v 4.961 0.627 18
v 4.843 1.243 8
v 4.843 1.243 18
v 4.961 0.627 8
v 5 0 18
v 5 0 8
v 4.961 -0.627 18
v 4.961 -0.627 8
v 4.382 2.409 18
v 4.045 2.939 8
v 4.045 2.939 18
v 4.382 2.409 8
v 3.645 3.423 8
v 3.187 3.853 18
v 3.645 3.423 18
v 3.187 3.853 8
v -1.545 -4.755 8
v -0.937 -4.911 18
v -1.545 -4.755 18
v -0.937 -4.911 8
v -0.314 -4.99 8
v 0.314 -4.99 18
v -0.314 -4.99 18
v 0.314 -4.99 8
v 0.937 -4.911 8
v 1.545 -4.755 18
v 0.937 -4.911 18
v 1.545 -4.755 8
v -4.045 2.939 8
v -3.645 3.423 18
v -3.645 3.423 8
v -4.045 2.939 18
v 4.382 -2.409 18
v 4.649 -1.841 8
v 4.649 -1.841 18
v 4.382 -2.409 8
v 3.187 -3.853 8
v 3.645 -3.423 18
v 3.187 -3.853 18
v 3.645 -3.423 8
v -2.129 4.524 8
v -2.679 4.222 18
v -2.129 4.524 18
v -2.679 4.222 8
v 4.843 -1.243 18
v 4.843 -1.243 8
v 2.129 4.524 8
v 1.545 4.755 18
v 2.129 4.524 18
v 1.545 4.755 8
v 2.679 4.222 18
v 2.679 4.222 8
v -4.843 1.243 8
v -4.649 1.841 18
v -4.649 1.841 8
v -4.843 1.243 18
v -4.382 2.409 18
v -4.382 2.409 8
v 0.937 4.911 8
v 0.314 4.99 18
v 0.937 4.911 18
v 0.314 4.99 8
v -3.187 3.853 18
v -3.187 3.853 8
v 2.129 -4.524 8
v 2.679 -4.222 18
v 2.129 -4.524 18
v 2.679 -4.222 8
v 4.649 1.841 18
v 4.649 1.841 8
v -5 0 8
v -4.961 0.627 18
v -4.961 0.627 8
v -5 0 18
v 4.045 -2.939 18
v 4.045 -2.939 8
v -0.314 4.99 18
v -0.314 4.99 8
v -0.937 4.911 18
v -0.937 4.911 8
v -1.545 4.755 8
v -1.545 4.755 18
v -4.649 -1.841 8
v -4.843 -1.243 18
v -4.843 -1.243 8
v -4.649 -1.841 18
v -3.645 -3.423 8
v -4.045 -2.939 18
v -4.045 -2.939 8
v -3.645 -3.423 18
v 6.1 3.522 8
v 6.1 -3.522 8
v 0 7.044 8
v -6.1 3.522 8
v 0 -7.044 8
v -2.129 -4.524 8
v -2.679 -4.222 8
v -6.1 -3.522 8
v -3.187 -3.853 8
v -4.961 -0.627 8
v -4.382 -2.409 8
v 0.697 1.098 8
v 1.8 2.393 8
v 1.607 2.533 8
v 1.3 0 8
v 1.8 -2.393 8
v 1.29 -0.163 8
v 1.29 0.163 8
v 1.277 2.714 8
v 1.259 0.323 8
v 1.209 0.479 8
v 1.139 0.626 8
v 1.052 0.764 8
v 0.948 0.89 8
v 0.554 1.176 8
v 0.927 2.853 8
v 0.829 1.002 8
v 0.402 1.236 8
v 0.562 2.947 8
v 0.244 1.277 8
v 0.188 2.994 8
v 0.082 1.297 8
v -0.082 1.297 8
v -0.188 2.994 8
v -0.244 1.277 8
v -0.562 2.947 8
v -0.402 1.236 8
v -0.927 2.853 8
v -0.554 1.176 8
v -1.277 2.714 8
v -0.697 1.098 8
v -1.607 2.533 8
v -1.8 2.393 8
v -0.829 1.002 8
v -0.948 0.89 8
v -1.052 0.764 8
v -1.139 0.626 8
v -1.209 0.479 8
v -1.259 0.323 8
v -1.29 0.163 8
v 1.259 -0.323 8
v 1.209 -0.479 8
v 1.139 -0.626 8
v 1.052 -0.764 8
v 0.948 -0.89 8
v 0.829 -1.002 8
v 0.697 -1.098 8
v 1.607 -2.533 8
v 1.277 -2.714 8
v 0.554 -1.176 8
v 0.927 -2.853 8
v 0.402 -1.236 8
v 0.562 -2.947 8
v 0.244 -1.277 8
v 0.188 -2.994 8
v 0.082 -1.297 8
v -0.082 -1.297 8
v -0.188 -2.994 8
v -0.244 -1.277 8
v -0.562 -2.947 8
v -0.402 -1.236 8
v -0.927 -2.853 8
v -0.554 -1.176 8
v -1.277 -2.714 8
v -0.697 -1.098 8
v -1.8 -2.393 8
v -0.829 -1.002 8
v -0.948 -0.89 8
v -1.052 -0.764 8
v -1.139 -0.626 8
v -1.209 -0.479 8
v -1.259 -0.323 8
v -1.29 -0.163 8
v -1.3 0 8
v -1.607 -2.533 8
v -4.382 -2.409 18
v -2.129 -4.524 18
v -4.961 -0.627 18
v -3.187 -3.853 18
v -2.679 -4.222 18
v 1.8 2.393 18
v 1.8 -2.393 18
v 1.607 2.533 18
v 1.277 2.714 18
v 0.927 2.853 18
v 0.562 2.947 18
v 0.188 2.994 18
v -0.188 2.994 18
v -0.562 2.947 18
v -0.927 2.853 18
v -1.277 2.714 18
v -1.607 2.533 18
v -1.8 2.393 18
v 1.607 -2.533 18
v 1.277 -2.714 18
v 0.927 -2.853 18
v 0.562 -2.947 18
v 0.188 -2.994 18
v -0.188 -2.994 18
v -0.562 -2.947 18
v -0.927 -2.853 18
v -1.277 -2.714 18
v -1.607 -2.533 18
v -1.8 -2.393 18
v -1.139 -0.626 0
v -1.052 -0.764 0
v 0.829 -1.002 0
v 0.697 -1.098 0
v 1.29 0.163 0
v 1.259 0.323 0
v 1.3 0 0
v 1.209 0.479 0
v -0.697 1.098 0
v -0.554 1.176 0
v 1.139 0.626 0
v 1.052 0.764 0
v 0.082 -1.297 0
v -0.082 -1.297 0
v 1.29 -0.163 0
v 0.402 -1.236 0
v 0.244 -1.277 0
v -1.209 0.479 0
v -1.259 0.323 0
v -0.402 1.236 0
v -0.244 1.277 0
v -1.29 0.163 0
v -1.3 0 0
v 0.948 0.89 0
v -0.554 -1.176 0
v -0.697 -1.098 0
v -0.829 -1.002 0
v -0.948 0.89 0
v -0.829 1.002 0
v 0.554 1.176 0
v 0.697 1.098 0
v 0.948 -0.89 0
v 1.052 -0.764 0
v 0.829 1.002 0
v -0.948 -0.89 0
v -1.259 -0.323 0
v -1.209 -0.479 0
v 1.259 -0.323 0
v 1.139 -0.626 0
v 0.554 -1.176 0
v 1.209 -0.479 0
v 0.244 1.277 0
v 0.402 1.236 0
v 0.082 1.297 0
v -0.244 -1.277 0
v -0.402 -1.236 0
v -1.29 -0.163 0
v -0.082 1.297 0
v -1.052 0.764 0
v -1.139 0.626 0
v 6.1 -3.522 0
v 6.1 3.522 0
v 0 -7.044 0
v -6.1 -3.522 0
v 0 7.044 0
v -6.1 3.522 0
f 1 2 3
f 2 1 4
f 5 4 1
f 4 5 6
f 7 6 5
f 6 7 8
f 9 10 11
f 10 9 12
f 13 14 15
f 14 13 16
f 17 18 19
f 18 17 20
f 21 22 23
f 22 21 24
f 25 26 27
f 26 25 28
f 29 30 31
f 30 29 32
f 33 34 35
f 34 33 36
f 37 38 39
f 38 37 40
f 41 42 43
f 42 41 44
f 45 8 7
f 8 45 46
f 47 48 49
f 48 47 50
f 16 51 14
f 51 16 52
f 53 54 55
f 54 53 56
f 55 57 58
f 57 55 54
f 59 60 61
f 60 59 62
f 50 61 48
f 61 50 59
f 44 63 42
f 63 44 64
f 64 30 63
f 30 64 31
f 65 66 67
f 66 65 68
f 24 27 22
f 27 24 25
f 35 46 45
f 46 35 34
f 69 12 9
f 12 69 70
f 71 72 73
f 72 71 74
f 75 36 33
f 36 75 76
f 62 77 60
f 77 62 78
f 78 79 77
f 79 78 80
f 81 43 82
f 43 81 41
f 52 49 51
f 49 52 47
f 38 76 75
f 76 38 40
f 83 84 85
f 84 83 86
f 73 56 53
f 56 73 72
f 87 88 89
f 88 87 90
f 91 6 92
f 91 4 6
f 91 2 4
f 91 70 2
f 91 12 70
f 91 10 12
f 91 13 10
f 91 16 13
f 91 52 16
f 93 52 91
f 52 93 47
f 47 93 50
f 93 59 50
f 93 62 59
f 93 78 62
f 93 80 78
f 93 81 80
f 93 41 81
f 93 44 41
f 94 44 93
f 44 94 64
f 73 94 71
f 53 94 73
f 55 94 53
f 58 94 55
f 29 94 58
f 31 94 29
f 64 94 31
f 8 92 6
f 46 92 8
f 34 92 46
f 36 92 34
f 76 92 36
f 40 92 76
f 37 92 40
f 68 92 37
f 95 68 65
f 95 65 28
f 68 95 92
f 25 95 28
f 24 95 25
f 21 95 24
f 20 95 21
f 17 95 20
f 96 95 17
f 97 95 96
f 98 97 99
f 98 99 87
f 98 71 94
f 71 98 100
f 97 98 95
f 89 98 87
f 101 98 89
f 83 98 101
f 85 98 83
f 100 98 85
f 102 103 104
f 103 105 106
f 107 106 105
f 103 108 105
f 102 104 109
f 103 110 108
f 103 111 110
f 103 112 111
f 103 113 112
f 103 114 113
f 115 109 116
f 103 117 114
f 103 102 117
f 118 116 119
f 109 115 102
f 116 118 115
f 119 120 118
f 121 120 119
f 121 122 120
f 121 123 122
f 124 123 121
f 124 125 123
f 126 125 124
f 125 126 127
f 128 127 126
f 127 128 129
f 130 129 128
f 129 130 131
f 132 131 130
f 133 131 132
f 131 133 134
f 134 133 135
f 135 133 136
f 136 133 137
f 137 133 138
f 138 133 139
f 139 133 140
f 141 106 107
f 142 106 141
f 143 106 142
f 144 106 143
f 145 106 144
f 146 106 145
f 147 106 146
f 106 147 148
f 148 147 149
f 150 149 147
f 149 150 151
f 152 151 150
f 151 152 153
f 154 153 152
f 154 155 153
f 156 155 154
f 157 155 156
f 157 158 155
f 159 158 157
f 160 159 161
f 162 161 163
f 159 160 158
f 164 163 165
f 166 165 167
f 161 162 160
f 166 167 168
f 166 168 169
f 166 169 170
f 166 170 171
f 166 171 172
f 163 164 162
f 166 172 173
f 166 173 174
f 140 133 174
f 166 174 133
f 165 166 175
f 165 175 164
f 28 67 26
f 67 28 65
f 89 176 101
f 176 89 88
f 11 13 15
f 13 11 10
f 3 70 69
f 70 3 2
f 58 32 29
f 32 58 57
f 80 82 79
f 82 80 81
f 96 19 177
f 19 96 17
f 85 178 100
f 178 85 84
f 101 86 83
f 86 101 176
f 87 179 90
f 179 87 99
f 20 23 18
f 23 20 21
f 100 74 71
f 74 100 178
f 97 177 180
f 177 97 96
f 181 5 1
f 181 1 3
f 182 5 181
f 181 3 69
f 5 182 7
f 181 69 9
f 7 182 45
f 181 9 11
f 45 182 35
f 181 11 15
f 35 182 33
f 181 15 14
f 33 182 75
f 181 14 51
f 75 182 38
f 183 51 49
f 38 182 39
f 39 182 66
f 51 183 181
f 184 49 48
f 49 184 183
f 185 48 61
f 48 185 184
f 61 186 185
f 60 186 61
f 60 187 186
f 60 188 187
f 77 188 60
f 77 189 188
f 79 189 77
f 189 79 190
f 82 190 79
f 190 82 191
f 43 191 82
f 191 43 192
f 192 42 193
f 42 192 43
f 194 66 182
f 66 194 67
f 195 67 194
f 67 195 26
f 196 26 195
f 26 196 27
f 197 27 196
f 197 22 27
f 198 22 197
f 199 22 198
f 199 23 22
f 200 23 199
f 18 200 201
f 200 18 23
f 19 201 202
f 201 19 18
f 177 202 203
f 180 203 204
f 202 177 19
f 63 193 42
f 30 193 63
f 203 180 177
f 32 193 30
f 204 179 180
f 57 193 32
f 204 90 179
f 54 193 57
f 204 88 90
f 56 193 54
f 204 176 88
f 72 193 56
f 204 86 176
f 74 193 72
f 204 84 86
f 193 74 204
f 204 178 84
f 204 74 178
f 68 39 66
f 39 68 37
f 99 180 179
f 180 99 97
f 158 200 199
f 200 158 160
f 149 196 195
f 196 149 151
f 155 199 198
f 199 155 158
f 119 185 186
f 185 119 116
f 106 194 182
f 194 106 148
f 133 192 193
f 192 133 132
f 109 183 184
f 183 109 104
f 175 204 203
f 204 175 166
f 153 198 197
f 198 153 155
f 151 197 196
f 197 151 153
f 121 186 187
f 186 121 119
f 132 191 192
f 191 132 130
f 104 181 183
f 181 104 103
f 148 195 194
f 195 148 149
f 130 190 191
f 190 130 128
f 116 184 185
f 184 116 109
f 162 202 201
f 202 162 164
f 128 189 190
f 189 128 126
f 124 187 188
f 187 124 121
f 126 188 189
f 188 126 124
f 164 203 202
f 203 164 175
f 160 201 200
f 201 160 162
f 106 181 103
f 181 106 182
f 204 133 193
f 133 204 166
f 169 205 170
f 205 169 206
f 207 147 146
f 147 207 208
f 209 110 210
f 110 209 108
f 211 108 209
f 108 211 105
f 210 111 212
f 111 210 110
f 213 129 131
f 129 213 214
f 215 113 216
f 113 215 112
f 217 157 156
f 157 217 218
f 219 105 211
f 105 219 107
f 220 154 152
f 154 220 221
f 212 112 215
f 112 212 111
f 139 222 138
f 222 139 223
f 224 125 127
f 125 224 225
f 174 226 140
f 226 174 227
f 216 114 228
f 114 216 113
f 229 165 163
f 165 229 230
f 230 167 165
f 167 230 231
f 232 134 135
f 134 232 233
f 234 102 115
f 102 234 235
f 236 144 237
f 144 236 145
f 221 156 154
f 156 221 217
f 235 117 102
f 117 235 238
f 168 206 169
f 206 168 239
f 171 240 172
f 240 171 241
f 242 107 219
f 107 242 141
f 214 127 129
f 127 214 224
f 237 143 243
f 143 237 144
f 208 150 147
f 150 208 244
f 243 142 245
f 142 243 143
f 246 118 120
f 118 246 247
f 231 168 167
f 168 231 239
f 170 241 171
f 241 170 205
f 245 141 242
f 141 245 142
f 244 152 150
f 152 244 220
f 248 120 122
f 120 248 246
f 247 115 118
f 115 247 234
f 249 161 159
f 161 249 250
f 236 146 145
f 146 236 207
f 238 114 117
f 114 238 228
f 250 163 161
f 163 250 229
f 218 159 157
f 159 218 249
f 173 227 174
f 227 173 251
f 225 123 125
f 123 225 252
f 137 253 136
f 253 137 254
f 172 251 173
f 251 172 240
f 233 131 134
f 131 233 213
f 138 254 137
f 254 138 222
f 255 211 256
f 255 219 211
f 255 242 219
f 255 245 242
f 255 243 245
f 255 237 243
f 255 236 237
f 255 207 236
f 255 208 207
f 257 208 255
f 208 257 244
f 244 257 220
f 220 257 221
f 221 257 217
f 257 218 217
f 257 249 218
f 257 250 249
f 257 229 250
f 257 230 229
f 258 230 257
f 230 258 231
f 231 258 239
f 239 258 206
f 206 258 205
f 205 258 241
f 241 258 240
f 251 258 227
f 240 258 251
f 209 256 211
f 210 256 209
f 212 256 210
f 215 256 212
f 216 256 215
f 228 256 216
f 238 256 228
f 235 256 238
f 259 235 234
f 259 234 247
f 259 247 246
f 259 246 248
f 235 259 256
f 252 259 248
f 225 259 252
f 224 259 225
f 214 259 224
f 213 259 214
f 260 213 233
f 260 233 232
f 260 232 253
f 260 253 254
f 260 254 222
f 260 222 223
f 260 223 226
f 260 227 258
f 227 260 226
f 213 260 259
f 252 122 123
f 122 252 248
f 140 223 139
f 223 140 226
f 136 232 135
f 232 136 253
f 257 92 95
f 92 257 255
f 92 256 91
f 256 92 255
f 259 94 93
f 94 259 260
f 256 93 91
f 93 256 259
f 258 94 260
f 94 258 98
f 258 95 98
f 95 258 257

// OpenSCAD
hexHeight = 8;
conectorHeight = 10;

translate([0, 0, hexHeight])
{
    motor_connector(conectorHeight);
};

difference()
{
    hexagon (12.2, height = hexHeight );
    hollow_cylinder(height = hexHeight , r_outer=1.3, r_inner = 0);
}

module hexagon(size, height)
{
    r = size / sqrt(3);
    echo(r);
    rotate(a=30, v=[0, 0, 1])
    {
        cylinder(r=r, height, $fn=6);
    }
}

module motor_connector(height)
{
    difference()
    {
        hollow_cylinder(height, r_outer=5, r_inner = 0);
        motor_inner_connector(height, width = 3.6, diameter = 6);
    }
}

module motor_inner_connector(h, width, diameter)
{
    intersection()
    {
        hollow_cylinder(h, r_outer=3, r_inner = 0);
        translate([-(width/2),-(diameter/2),0])
        {
            cube([width, diameter, h]);
        }
    }
}

module hollow_cylinder(height, r_outer, r_inner)
{
    difference()
    {
        cylinder(h=height, r=r_outer, center=false, $fn=50);
        cylinder(h=height, r=r_inner, center=false, $fn=50);
    }
}
